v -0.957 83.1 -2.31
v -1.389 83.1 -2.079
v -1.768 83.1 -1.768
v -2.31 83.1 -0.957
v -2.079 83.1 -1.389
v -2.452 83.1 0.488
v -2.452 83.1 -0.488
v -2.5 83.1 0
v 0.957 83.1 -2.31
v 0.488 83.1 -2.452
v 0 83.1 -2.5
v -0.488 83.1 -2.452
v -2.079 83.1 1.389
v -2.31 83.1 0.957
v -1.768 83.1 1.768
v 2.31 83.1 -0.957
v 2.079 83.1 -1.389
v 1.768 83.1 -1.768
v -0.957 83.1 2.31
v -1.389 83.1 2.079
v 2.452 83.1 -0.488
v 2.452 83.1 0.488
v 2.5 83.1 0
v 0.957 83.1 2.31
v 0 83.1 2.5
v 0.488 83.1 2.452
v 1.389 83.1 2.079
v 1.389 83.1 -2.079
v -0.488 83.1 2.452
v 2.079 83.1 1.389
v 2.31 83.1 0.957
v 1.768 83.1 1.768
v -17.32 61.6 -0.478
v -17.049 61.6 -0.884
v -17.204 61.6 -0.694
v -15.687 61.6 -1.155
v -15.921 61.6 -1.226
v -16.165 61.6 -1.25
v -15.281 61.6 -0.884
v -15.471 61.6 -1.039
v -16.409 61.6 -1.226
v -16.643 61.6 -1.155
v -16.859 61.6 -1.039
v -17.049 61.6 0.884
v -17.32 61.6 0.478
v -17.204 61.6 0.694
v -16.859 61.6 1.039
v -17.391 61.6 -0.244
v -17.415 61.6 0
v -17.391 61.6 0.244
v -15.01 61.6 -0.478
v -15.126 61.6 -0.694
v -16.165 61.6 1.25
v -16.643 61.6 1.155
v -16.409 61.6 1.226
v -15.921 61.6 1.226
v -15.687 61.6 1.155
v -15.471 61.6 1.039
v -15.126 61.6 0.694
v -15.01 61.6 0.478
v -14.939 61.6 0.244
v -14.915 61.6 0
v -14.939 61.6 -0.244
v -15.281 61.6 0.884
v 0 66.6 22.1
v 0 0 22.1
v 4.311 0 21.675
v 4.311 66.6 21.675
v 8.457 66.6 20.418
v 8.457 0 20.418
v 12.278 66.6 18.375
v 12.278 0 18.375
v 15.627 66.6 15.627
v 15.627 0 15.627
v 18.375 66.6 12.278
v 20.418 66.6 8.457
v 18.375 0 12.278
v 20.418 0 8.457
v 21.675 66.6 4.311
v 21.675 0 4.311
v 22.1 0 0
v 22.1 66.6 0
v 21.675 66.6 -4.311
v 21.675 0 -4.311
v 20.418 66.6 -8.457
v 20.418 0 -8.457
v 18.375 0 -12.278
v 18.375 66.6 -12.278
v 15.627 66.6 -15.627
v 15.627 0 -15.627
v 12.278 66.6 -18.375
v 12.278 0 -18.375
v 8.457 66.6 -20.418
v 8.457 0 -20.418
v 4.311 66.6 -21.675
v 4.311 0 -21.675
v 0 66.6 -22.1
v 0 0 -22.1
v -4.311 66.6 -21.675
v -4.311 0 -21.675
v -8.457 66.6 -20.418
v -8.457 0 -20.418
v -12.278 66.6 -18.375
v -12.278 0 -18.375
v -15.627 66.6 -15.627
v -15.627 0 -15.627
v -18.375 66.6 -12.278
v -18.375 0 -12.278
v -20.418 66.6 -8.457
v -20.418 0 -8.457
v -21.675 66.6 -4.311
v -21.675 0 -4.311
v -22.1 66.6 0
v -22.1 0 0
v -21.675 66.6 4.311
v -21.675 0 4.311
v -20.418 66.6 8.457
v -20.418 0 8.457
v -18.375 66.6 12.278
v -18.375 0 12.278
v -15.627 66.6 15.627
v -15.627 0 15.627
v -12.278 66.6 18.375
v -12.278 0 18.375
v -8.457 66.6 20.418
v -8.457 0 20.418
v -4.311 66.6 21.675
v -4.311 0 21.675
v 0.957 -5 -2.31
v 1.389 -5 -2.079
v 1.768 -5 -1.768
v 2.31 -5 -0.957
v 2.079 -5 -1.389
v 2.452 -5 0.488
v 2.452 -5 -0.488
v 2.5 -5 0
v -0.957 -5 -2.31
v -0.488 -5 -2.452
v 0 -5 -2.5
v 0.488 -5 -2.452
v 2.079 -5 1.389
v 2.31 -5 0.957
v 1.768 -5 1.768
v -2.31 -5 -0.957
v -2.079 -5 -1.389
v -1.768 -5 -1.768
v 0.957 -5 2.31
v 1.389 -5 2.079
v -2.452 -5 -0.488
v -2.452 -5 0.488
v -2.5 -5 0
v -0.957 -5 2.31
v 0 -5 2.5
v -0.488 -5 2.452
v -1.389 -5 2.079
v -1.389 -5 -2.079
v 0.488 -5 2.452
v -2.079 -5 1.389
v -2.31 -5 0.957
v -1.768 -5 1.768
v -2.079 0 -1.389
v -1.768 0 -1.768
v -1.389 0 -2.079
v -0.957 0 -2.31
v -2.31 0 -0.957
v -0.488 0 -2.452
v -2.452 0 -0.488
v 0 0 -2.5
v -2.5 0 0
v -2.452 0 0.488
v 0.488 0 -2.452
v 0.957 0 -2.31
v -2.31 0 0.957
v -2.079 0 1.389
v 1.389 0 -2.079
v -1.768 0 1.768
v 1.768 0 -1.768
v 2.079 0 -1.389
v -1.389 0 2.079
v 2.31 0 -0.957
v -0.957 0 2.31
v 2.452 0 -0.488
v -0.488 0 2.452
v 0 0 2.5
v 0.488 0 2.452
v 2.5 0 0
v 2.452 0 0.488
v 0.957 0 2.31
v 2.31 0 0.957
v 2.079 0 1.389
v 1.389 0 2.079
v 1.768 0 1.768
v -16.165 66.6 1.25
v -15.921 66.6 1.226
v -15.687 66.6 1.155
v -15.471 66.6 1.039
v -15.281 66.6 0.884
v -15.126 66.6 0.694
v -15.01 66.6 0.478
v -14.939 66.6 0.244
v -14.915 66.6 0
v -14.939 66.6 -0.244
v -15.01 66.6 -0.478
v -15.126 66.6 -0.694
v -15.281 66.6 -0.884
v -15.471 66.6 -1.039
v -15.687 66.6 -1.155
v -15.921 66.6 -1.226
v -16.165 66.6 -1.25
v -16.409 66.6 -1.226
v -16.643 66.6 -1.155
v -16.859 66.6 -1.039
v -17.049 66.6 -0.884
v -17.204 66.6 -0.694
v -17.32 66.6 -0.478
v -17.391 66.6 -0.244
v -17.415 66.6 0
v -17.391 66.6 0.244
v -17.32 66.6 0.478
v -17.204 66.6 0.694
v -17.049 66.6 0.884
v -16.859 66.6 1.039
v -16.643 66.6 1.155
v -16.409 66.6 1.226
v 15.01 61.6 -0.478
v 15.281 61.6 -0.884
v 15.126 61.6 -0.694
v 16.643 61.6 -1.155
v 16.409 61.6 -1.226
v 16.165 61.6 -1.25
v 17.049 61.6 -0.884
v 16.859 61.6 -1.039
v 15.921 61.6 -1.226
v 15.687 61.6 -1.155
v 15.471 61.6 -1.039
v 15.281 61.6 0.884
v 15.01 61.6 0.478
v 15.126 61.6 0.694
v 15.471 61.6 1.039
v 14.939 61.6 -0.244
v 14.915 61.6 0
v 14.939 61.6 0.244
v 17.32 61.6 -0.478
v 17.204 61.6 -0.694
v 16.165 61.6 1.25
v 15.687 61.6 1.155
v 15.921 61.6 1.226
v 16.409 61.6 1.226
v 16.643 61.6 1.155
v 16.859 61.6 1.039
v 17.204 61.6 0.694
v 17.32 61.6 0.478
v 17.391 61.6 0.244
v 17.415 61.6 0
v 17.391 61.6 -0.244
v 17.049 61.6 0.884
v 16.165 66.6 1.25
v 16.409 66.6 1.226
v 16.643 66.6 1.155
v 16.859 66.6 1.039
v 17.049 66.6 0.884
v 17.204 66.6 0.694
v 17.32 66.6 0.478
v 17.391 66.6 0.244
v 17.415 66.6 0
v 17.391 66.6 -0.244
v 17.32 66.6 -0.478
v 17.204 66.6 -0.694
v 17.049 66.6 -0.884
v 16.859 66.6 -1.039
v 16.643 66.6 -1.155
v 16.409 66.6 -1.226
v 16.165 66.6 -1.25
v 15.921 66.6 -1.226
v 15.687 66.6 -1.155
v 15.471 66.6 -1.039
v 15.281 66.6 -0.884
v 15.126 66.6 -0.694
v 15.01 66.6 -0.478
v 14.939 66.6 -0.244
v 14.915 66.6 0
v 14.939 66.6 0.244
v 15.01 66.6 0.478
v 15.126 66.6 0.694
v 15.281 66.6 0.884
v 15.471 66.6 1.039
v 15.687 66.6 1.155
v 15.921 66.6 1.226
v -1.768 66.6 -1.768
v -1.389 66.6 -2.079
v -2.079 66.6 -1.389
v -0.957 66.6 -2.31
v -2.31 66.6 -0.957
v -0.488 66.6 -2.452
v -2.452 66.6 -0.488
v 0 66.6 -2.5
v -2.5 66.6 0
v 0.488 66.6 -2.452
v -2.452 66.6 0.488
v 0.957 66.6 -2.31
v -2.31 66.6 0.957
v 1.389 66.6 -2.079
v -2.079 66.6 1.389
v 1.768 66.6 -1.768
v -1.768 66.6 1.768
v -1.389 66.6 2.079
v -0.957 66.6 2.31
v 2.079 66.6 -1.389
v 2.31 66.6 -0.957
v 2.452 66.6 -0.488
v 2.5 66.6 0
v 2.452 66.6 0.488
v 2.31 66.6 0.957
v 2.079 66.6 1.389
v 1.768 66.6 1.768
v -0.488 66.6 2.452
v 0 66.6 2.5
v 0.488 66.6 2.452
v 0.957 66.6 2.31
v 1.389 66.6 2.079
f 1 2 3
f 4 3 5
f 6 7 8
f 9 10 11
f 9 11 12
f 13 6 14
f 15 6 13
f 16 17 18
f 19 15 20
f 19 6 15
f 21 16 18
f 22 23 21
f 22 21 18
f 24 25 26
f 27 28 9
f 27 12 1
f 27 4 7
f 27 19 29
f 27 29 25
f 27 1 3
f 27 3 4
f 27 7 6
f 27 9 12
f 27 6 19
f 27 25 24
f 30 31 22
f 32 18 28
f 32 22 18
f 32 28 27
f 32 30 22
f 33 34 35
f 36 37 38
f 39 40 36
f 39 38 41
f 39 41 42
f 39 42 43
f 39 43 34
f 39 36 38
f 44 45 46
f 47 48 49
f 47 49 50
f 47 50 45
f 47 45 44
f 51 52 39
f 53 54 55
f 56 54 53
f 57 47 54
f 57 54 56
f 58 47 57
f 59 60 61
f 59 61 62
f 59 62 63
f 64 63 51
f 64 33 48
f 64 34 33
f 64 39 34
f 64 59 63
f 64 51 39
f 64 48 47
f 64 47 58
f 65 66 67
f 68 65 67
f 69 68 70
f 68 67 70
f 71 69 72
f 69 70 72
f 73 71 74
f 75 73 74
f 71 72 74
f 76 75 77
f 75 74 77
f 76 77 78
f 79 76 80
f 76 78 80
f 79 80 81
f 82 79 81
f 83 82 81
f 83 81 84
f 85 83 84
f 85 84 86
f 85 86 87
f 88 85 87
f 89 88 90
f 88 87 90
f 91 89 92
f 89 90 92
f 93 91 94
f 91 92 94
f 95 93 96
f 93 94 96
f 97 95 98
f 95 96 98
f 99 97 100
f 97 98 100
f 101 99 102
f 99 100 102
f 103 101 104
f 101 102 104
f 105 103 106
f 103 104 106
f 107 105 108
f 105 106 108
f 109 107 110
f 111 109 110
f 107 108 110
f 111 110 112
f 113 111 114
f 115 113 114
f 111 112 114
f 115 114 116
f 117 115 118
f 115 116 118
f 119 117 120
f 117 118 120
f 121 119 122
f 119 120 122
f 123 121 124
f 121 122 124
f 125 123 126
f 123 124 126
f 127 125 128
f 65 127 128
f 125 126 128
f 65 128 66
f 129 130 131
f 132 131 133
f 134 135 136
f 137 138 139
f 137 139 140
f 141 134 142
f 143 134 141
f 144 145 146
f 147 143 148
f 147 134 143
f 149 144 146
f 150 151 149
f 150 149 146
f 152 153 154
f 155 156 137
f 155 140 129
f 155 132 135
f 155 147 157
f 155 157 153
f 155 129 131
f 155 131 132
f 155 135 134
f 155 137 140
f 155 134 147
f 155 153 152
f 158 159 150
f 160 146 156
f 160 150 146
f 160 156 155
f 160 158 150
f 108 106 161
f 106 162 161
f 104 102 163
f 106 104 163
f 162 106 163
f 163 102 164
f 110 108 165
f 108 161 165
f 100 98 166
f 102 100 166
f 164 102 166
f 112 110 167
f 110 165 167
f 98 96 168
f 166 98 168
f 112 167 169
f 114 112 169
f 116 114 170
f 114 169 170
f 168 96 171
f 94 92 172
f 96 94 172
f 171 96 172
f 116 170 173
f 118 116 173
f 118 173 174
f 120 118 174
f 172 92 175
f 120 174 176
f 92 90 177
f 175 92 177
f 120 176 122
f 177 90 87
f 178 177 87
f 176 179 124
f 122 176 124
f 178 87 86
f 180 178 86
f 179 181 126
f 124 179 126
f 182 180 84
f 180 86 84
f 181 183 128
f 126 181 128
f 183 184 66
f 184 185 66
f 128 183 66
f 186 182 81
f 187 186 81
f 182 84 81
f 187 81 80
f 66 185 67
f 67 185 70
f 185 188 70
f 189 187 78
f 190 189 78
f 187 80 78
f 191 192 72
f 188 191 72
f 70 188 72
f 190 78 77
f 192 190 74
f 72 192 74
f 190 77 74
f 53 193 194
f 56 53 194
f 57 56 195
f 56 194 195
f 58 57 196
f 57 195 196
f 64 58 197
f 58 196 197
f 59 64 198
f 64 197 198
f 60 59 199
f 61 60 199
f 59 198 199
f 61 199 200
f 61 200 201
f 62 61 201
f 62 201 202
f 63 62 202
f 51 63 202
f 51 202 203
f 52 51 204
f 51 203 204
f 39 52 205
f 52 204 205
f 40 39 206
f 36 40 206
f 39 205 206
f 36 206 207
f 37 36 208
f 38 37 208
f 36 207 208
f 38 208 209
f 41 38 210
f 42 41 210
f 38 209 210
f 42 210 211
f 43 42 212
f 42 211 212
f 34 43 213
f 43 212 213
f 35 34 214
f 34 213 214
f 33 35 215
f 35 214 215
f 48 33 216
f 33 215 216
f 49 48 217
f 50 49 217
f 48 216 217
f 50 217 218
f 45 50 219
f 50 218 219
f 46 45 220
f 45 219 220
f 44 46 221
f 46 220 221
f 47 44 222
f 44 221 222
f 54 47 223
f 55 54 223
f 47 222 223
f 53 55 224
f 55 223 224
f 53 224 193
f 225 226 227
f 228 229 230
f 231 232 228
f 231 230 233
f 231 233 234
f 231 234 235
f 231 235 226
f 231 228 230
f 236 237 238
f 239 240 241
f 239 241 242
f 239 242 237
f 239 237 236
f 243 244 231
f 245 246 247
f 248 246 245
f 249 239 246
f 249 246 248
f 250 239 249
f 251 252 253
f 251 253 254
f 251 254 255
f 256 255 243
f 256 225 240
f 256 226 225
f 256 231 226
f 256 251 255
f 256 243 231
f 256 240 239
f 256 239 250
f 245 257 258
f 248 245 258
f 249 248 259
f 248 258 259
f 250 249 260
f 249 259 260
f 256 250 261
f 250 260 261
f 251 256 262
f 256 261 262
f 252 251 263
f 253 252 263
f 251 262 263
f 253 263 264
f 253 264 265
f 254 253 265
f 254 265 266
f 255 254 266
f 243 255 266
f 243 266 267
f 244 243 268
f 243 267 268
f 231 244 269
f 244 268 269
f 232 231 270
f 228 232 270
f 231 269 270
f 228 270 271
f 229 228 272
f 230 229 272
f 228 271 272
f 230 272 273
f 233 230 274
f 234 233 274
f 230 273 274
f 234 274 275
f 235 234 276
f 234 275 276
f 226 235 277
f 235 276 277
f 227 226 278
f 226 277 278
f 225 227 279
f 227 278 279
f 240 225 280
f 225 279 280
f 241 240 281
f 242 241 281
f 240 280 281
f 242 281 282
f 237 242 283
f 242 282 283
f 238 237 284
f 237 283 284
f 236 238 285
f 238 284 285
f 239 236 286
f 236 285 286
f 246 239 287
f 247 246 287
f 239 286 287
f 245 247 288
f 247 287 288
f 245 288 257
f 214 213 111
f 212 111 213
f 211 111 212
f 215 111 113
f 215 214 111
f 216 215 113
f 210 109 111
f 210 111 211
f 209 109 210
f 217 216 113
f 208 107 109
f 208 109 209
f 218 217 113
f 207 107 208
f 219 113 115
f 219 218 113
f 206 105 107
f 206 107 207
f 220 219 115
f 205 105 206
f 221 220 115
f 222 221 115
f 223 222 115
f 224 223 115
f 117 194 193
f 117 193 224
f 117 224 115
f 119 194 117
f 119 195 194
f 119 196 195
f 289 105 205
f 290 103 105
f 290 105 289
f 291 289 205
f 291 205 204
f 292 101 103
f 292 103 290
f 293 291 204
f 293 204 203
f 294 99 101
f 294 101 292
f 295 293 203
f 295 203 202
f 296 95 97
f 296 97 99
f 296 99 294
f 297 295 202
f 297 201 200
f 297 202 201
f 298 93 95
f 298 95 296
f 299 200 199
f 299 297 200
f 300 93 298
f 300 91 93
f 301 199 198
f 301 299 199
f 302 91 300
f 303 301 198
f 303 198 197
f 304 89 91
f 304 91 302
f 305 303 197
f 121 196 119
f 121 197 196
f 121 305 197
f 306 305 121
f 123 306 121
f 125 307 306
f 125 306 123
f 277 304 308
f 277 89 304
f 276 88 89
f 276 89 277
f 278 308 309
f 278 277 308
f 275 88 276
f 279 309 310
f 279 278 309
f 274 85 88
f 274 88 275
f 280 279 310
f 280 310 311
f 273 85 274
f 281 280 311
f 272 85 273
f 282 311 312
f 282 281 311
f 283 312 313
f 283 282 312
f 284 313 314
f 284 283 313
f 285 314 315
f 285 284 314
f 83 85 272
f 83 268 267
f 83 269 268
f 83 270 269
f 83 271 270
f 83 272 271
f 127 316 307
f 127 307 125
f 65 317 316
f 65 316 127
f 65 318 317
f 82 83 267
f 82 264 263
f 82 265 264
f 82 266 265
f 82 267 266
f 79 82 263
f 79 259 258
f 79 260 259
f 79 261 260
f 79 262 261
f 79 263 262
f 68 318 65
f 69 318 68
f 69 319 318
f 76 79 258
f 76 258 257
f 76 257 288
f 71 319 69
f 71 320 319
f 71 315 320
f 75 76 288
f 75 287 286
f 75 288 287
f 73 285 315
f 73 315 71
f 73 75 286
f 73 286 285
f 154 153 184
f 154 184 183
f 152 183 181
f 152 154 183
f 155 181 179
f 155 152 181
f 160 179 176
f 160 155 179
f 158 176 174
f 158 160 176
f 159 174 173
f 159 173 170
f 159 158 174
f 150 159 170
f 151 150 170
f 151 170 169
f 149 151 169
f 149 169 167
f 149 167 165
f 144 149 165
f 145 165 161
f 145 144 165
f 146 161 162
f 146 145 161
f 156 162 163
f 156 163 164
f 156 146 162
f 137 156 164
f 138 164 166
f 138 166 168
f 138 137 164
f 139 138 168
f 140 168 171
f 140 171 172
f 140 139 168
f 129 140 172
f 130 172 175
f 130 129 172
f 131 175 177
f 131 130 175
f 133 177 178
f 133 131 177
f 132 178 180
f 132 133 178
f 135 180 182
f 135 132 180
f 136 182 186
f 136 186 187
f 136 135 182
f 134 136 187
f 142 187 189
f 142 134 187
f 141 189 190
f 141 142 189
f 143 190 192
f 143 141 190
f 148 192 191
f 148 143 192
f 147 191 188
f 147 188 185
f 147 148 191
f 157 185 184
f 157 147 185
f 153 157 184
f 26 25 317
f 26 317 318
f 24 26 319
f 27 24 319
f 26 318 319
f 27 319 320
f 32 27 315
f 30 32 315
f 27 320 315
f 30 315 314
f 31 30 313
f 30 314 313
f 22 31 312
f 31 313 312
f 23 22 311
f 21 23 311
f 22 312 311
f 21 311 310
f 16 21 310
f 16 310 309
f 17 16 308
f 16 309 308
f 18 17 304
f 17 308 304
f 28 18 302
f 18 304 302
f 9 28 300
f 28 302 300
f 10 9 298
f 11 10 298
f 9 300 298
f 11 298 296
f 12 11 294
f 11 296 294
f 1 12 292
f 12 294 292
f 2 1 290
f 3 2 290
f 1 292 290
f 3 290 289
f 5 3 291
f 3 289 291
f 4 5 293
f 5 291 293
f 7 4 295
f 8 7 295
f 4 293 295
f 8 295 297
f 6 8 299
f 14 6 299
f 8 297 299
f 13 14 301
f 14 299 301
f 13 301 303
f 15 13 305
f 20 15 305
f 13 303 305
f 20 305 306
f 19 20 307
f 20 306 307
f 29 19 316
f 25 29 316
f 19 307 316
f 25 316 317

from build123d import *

# Parameters (mm, degrees)
SKETCH_1_R          = 22.1
EXTRUDE_1_DEPTH     = 66.6
SKETCH_2_R          = 2.5
EXTRUDE_2_DEPTH     = 16.5
EXTRUDE_START       = 5
SKETCH_3_R          = 2.5
EXTRUDE_3_DEPTH     = 5
SKETCH_4_R          = 1.25
CUT_EXTRUDE_1_DEPTH = 5


with BuildPart() as part:
    # 草圖1 → 填料-伸長1 (new body)
    with BuildSketch(Plane(origin=(0, 0, 0), x_dir=(1, 0, 0), z_dir=(0, 1, 0))):
        with Locations(Location((0, 0, 0), (0, 0, 270))):
            Circle(SKETCH_1_R)
    extrude(amount=EXTRUDE_1_DEPTH)

    # 草圖2 → 填料-伸長2 (add)
    with BuildSketch(Plane(origin=(0, 66.6, 0), x_dir=(1, 0, 0), z_dir=(0, 1, 0))):
        with Locations(Location((0, 0, 0), (0, 0, 270))):
            Circle(SKETCH_2_R)
    extrude(amount=EXTRUDE_2_DEPTH)

    # 草圖3 → 填料-伸長3 (add)
    with BuildSketch(Plane.XZ.offset(EXTRUDE_START)):
        with Locations(Location((0, 0, 0), (0, 0, 90))):
            Circle(SKETCH_3_R)
    extrude(amount=-EXTRUDE_3_DEPTH)

    # 草圖4 → 除料-伸長1 (cut)
    with BuildSketch(Plane(origin=(0, 66.6, 0), x_dir=(1, 0, 0), z_dir=(0, 1, 0))):
        with Locations(Location((-16.165, 0, 0), (0, 0, 270))):
            Circle(SKETCH_4_R)
        with Locations(Location((16.165, 0, 0), (0, 0, 270))):
            Circle(SKETCH_4_R)
    extrude(amount=-CUT_EXTRUDE_1_DEPTH, mode=Mode.SUBTRACT)


solid = part.part
